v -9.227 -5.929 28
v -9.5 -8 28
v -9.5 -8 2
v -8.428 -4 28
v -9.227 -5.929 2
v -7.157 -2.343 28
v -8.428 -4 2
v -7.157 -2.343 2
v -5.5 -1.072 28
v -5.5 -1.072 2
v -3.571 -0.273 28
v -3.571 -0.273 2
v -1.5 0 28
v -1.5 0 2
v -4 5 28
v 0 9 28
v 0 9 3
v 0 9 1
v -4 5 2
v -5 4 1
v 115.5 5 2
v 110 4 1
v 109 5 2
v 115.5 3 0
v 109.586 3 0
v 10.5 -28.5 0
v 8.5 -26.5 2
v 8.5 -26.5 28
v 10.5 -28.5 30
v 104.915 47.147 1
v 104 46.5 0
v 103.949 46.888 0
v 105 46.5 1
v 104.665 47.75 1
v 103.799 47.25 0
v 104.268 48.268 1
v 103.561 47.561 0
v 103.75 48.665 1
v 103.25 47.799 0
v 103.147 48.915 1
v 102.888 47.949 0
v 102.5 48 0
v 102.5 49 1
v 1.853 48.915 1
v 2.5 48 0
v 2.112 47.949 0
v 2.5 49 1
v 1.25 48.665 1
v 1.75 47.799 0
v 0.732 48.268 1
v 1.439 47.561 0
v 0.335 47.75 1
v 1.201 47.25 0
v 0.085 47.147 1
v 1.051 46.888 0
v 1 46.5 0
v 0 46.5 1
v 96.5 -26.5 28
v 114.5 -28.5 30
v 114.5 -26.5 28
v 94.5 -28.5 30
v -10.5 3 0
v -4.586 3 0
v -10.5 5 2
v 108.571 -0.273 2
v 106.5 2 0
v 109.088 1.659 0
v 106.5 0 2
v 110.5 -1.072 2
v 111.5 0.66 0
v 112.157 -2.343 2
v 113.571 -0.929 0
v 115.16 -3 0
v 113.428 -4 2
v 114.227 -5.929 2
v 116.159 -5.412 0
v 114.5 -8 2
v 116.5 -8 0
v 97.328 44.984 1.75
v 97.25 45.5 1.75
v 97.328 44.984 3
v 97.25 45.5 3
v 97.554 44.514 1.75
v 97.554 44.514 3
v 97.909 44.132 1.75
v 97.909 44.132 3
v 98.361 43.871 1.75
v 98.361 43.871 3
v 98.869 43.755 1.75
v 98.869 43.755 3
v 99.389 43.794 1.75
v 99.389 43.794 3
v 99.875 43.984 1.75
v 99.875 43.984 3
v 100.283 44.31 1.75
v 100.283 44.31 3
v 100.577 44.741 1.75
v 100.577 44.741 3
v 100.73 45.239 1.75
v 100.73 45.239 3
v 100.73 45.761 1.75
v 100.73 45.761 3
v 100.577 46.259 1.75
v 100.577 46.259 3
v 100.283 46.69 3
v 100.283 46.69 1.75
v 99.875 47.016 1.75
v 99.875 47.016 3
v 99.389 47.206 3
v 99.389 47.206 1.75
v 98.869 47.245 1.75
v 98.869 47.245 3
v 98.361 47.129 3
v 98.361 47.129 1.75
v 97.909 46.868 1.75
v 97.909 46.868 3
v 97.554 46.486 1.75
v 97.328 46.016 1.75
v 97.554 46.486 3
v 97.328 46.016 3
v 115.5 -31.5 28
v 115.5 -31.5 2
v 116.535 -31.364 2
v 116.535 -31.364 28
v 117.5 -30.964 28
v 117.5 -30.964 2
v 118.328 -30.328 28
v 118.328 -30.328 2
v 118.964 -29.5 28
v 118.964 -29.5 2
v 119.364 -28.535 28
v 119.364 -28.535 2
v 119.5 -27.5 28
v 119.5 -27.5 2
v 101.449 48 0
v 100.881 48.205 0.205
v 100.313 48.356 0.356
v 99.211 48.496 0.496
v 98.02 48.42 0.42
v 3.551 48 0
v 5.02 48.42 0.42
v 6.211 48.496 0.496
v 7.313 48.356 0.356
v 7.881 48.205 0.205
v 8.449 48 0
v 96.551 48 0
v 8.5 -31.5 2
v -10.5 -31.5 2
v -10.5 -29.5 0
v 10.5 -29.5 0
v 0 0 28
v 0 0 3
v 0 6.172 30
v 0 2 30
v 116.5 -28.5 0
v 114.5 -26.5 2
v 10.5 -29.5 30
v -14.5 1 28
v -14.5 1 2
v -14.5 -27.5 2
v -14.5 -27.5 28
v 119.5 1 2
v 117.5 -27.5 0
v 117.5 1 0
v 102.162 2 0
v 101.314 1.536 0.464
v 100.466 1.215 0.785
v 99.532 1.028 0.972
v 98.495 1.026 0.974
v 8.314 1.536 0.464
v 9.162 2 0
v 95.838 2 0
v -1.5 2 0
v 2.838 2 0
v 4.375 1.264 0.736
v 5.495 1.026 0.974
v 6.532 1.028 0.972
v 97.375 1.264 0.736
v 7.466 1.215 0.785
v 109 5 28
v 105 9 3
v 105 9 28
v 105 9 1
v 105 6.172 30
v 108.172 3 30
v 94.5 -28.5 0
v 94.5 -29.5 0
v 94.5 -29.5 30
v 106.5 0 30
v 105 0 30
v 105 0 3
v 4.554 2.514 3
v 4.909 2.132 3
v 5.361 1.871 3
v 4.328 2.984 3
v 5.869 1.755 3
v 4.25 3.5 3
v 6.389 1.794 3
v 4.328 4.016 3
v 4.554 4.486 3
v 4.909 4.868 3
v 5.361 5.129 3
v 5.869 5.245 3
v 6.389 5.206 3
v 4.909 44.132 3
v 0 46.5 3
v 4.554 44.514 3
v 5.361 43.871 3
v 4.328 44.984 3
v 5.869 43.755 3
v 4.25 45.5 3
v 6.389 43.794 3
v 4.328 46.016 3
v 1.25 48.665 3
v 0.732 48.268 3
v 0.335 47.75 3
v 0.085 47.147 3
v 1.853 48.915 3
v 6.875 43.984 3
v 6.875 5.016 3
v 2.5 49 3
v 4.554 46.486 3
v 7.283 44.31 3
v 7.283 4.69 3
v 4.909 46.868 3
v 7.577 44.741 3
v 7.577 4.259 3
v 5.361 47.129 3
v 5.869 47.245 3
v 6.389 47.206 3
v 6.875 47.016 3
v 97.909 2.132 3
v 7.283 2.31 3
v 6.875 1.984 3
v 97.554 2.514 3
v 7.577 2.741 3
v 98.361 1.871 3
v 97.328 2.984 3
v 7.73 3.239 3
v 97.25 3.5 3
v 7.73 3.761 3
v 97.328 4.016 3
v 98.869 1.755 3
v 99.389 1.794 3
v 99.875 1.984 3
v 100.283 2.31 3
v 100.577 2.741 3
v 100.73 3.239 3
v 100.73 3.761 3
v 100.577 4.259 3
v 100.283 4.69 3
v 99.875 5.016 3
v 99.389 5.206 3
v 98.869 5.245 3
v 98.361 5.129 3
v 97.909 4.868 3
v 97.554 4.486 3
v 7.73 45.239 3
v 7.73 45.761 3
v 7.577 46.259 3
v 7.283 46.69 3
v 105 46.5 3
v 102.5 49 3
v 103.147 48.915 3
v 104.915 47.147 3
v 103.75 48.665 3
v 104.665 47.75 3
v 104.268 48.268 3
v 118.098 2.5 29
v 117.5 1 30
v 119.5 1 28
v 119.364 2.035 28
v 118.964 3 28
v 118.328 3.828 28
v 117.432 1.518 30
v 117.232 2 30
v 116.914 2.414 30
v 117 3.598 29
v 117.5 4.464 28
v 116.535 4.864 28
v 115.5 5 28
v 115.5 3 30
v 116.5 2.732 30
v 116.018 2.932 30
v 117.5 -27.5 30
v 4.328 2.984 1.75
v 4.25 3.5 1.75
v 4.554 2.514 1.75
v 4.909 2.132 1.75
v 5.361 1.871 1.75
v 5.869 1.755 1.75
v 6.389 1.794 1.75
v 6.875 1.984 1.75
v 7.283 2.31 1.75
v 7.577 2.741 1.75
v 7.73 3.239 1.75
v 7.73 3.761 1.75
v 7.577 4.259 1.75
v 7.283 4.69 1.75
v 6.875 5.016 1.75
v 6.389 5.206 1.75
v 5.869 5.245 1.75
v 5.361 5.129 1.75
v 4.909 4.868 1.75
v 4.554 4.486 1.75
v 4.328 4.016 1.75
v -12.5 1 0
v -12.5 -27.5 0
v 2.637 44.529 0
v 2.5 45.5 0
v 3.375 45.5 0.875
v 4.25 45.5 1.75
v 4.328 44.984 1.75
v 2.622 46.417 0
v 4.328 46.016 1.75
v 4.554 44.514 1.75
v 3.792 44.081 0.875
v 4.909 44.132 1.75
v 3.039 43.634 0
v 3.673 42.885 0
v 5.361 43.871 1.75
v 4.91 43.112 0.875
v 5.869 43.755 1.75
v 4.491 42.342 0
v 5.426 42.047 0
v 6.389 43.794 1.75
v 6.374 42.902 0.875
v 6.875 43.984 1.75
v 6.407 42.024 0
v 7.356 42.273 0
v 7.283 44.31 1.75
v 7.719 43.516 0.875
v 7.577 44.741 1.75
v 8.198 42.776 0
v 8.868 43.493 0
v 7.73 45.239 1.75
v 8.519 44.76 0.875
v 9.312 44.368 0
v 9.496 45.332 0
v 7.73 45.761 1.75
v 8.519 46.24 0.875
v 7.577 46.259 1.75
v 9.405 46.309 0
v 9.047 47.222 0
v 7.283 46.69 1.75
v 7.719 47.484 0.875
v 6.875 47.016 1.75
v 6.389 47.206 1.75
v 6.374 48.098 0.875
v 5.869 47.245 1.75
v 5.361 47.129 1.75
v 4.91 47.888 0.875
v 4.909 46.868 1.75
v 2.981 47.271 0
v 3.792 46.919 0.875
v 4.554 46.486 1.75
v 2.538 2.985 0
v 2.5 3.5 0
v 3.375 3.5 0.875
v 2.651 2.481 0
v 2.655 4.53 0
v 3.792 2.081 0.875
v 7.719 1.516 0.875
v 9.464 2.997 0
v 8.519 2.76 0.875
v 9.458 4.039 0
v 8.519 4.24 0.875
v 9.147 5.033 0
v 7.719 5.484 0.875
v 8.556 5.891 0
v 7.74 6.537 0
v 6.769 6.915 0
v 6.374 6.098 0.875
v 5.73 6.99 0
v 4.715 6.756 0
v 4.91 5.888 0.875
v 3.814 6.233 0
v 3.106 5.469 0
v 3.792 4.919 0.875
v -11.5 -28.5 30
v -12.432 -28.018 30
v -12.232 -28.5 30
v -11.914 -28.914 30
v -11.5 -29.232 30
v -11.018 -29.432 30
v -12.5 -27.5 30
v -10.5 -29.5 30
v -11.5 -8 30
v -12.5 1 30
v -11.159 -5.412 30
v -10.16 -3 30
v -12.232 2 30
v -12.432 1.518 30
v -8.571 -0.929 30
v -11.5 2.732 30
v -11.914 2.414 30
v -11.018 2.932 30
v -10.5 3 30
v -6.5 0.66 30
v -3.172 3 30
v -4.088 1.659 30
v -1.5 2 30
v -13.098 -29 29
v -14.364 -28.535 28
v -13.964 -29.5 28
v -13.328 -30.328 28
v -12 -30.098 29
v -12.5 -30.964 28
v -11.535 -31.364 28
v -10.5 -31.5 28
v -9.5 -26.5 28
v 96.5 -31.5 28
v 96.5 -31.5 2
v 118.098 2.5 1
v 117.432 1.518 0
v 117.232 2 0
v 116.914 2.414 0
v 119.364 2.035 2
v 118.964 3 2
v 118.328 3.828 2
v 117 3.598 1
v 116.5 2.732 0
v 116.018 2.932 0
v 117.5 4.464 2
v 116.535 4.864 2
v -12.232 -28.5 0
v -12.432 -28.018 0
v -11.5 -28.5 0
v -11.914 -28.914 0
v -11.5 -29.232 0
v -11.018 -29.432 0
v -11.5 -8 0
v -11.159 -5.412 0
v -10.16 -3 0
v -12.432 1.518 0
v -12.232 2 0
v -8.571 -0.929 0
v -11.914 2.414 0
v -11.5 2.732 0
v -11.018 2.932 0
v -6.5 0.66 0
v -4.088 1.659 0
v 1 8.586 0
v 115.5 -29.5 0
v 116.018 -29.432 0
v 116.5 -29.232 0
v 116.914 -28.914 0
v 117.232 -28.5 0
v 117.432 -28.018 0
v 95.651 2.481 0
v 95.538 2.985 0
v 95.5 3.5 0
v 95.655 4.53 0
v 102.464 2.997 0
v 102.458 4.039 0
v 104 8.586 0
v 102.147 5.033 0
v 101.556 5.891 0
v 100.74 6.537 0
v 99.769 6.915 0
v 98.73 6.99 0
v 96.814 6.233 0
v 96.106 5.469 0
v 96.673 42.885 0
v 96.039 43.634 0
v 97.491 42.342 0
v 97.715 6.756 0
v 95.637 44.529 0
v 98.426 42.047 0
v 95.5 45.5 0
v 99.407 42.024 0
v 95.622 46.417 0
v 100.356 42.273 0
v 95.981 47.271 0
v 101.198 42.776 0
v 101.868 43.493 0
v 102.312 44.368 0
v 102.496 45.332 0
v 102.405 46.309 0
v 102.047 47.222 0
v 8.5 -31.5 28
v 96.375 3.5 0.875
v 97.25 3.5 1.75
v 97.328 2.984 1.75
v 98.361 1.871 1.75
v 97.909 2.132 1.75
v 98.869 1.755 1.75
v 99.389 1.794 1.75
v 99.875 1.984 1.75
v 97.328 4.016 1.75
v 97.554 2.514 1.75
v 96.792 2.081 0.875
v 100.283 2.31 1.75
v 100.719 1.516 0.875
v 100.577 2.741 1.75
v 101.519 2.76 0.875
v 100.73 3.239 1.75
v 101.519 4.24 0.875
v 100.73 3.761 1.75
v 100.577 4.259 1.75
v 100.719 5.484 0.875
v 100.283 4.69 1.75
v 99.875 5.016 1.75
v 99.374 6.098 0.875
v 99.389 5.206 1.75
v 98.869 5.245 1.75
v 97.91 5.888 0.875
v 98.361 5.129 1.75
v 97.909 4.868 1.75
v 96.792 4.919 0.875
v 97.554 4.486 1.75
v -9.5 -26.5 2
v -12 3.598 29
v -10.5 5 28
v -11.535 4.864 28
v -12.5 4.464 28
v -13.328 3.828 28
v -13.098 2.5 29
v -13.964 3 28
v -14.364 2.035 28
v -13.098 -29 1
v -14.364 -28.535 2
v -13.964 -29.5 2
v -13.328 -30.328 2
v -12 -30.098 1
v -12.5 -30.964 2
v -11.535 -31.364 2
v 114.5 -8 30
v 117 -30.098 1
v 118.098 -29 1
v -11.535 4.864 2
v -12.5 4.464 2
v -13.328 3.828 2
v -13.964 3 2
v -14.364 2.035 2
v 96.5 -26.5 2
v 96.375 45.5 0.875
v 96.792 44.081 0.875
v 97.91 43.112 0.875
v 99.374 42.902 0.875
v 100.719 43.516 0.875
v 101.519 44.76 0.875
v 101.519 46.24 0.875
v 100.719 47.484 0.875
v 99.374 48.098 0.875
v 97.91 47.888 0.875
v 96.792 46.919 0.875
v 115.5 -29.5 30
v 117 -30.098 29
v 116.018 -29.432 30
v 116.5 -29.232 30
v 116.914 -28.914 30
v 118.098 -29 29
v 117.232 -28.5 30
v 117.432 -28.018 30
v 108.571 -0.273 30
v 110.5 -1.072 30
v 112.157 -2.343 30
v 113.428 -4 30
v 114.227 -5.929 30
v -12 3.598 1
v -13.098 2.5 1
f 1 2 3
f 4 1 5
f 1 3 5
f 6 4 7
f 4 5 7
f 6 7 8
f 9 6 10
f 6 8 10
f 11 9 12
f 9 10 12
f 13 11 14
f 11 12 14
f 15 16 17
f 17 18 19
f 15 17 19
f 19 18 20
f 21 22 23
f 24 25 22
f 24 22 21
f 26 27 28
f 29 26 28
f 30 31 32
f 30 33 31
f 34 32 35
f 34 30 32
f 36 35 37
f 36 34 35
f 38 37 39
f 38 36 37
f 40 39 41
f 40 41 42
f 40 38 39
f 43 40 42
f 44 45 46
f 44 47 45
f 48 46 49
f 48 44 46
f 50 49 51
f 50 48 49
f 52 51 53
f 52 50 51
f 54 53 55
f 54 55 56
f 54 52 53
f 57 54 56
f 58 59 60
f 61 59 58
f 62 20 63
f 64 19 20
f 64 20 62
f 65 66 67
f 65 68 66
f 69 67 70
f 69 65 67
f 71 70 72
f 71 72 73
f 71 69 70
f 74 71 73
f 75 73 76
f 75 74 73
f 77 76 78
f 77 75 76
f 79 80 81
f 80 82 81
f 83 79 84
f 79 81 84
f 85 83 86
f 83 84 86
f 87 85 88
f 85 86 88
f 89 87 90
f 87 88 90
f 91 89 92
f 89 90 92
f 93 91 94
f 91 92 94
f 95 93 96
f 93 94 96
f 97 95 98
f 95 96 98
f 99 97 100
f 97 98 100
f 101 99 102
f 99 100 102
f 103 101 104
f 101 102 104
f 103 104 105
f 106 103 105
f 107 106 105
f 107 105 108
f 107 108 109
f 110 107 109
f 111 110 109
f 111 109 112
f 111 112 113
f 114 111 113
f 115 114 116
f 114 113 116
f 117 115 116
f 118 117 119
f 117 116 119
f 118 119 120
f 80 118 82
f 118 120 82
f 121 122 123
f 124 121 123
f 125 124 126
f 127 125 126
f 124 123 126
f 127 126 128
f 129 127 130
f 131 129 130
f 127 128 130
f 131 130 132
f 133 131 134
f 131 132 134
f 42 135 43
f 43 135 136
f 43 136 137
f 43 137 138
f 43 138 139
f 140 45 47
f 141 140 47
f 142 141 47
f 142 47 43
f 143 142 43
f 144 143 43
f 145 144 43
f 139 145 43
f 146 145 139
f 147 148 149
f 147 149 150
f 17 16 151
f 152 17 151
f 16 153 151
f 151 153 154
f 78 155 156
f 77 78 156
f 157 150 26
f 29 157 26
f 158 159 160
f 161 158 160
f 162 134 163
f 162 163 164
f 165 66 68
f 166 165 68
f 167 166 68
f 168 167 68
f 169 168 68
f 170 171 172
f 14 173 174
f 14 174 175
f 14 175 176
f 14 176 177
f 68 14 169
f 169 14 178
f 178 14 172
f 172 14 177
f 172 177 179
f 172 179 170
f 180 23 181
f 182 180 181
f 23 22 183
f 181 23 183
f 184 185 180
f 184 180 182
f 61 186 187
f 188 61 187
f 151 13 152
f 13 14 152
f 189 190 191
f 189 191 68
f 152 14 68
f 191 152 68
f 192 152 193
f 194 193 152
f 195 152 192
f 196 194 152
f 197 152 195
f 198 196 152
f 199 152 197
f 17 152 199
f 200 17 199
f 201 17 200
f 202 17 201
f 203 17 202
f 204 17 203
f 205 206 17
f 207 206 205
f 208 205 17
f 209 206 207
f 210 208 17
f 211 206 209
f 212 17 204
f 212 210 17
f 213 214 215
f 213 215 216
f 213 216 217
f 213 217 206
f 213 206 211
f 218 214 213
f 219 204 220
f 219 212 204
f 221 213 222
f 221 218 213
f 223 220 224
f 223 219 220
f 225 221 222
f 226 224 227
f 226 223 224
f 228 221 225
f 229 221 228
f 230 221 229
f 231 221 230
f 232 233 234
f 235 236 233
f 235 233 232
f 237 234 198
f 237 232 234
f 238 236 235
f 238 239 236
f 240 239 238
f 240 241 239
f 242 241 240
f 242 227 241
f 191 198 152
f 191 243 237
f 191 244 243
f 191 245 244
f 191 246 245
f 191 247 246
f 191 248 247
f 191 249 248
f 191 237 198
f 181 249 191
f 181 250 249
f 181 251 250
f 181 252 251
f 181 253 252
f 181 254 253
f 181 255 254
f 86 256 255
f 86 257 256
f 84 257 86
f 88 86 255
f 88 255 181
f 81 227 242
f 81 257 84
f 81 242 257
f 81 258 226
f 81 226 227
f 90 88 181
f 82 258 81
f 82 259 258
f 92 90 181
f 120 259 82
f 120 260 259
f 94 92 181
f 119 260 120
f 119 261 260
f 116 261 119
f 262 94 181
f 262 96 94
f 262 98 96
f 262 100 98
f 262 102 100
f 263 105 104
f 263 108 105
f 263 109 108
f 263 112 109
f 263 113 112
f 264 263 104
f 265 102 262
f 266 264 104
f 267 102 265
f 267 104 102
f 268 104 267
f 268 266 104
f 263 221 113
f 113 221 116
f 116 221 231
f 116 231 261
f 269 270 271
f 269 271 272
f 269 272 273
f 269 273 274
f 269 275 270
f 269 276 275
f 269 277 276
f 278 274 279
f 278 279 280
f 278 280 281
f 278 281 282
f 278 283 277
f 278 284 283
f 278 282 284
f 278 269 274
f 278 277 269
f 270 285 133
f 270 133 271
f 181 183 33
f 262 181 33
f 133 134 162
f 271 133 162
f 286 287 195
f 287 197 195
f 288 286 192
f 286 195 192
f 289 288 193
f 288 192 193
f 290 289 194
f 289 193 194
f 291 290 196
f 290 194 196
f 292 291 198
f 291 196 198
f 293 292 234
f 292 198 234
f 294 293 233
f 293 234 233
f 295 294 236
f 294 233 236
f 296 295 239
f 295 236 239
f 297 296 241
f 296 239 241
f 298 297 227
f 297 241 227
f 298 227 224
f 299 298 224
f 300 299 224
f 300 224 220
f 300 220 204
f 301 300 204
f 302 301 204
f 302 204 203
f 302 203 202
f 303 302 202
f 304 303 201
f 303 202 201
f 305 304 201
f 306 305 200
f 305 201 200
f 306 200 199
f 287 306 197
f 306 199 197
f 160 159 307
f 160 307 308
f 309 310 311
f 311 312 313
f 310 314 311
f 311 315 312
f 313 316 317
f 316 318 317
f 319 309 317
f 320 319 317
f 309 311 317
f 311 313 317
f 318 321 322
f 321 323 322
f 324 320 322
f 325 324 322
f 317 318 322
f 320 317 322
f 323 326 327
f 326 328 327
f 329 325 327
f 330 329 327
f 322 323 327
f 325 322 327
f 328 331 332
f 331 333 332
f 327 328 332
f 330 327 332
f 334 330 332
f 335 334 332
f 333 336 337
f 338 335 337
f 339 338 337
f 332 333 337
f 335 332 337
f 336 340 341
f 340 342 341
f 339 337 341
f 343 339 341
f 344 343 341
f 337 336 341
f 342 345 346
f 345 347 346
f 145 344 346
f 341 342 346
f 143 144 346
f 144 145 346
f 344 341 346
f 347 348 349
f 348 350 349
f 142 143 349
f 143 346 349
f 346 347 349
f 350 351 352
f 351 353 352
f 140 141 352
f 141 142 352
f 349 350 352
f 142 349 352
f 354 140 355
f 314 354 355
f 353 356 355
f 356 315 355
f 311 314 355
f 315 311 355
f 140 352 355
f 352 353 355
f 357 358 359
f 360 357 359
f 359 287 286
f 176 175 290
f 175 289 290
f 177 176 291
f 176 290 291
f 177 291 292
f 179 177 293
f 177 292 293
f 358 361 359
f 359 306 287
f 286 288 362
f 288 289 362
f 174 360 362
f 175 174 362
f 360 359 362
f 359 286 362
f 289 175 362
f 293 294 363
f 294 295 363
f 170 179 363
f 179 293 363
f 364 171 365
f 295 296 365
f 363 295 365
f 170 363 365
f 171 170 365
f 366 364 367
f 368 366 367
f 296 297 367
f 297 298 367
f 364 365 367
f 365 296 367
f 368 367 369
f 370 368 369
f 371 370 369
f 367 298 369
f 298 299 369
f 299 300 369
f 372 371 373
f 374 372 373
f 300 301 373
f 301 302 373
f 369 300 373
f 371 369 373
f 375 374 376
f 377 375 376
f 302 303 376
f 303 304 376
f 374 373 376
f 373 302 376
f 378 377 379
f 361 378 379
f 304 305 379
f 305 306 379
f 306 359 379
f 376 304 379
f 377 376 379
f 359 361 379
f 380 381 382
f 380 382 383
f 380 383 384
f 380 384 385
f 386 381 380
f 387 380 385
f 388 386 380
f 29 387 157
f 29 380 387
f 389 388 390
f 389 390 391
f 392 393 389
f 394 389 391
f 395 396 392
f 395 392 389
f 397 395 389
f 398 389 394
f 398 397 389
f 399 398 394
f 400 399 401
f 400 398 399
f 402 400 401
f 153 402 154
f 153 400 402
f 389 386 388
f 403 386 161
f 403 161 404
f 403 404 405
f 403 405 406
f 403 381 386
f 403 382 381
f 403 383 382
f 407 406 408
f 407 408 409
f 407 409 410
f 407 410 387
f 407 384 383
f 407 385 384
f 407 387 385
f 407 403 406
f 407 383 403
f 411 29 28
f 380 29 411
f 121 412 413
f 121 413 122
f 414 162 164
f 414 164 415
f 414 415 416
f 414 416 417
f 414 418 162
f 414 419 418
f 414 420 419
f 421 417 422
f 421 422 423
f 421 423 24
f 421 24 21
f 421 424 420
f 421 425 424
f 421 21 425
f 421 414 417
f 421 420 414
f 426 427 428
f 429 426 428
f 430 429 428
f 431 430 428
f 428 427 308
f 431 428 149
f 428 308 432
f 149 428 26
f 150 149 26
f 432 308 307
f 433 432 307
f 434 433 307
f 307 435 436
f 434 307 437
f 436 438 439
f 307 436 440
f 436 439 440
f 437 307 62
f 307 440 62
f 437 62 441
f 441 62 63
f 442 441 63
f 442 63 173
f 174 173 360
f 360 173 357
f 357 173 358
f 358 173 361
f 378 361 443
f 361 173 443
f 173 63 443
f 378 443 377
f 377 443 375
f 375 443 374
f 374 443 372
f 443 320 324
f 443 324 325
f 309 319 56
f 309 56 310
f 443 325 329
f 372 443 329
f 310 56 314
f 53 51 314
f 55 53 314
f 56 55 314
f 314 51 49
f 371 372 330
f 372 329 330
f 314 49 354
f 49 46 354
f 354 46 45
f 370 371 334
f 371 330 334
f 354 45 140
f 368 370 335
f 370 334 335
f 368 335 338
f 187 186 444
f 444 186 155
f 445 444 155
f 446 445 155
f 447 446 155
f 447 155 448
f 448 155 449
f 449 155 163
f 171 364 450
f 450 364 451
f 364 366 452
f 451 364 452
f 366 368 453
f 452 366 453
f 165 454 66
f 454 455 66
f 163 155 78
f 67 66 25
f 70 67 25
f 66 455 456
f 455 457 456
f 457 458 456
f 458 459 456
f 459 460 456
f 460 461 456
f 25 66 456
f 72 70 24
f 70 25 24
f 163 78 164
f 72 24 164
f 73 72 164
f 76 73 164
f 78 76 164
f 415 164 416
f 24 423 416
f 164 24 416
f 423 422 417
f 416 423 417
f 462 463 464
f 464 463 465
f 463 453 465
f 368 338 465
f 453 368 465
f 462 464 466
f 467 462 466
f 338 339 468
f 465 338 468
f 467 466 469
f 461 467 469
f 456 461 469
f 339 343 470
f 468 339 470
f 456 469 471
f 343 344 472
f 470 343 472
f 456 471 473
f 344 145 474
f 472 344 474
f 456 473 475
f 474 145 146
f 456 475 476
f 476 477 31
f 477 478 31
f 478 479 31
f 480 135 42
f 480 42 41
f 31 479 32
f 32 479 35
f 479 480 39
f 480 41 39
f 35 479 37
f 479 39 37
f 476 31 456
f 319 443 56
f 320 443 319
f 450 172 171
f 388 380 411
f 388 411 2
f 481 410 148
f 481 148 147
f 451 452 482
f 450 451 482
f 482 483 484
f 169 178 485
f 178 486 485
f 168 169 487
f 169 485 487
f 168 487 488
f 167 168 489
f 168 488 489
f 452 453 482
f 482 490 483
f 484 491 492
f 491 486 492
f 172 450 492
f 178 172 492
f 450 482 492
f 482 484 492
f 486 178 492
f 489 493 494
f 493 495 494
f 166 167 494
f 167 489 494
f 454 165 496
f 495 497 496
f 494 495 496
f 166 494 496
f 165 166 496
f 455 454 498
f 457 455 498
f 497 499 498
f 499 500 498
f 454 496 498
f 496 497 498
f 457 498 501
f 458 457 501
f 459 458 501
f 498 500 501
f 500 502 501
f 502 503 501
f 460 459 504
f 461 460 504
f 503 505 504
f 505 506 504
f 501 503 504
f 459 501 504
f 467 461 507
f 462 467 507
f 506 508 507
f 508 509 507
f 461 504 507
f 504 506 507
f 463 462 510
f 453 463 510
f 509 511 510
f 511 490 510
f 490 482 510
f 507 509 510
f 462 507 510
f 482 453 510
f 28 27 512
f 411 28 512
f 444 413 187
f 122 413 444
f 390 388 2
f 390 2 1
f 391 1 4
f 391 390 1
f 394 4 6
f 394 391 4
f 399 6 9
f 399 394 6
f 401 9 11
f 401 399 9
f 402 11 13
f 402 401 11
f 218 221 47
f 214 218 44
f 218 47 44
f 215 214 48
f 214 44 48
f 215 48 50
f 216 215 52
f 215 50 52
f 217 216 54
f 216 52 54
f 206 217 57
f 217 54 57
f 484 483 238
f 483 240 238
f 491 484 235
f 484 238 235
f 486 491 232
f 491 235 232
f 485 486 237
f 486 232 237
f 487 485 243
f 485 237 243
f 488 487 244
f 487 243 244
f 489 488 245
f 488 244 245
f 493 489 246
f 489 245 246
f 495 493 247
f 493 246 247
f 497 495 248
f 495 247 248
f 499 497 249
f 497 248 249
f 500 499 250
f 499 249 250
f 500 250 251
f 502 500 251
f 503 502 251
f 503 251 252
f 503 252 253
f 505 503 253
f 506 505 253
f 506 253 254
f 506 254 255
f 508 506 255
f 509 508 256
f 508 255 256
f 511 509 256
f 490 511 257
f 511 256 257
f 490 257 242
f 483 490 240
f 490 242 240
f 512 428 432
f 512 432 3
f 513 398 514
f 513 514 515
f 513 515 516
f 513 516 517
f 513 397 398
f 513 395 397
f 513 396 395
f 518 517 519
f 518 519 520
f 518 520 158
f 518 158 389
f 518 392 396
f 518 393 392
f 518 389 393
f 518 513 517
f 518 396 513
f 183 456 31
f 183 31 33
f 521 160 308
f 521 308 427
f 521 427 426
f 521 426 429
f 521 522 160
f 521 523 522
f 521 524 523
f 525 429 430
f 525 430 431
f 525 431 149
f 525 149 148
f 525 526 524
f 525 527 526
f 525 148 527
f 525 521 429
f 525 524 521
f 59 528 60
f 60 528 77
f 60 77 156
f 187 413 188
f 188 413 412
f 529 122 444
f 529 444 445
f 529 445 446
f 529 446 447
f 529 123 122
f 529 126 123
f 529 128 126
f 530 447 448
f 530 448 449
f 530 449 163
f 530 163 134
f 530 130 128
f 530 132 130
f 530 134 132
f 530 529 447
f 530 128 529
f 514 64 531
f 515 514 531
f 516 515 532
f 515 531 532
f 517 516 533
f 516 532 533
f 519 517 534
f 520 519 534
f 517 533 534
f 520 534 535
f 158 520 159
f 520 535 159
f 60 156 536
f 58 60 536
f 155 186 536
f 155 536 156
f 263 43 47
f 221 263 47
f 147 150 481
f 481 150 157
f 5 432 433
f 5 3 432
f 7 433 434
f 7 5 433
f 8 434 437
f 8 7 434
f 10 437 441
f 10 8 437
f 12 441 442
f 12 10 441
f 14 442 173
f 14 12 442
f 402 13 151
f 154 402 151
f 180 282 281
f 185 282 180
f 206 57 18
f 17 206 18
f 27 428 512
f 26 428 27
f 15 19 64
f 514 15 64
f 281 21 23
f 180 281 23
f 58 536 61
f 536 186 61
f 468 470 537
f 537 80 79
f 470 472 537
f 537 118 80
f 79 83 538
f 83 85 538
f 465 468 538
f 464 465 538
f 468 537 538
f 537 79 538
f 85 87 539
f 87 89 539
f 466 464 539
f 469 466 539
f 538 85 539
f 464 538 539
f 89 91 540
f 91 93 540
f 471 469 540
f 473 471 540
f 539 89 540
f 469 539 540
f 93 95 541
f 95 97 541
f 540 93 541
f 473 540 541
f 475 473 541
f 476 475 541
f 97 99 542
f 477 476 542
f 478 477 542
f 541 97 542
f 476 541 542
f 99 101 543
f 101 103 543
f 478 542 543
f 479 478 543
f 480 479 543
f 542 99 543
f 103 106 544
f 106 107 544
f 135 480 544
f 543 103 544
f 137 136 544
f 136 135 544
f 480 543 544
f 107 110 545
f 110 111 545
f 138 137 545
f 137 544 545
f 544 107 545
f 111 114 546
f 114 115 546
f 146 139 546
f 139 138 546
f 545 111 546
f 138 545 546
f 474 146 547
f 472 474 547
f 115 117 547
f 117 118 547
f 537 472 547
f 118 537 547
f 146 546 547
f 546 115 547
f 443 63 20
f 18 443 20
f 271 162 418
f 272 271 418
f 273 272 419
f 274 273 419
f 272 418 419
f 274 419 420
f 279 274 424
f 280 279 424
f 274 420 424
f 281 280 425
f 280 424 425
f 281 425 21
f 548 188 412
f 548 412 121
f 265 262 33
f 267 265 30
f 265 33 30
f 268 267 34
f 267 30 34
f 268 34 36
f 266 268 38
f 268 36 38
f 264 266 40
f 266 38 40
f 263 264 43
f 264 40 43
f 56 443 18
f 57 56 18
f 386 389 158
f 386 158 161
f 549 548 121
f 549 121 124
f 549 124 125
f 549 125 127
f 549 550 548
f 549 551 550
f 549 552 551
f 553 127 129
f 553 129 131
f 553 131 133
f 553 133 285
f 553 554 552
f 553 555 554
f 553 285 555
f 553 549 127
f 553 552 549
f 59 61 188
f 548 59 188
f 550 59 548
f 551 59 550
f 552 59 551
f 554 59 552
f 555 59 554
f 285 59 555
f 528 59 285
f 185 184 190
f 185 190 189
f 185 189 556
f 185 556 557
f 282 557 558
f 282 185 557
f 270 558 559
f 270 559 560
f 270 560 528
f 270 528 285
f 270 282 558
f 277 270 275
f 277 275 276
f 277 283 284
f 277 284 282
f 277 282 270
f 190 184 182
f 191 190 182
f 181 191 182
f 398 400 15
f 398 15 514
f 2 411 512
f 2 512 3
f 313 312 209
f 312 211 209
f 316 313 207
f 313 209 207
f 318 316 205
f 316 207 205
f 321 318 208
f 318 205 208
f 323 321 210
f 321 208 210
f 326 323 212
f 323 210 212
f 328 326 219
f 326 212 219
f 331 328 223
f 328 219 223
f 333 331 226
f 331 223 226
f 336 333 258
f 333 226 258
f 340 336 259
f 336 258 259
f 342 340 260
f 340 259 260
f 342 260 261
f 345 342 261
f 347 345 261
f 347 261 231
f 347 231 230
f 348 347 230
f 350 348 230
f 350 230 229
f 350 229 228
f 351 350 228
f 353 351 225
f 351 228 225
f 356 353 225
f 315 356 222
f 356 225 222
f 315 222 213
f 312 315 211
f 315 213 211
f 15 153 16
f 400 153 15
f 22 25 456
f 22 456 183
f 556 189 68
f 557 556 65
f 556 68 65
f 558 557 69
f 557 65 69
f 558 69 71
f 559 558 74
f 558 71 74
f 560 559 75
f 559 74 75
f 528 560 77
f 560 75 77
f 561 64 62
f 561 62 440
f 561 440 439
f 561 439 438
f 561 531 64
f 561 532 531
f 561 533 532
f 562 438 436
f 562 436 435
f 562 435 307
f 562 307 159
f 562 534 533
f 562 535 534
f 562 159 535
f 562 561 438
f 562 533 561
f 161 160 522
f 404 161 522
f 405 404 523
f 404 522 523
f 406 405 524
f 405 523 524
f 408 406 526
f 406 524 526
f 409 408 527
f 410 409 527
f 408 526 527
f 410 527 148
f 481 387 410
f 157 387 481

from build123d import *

# Parameters (mm, degrees)
F1_DEPTH       = 30
F3_DEPTH       = 27
F4_SIZE        = 2
F5_SIZE        = 2
F7_D           = 3.5
F7_CSINK_D     = 7
F7_CSINK_ANGLE = 90
F8_T1_DEPTH    = 108
F8_T6_DEPTH    = 25.6433659759
F8_T12_DEPTH   = 25.6433659759
F8_T17_DEPTH   = 25.6433659759
F8_T22_DEPTH   = 25.6433659759
F8_T26_ANGLE   = 90
F8_T28_ANGLE   = 90
F9_T1_DEPTH    = 100
F9_T6_DEPTH    = 40.0716830997
F9_T11_DEPTH   = 13.6286473502
F9_T17_DEPTH   = 13.6286473502
F9_T21_ANGLE   = 90
F9_T23_ANGLE   = 90
F9_T27_DEPTH   = 40.0716830997
F9_T33_DEPTH   = 13.6286473502
F9_T37_DEPTH   = 40.0716830997
F9_T44_DEPTH   = 40.0716830997
F9_T48_DEPTH   = 13.6286473502


# Not quite as in the source:
# - a fillet or chamfer that OpenCascade refuses, or shapes differently, is made with other operations: its cross-section is extruded or revolved along the edge and cut away or added


with BuildPart() as f1:
    # F0 (on Top) → F1 (new body)
    with BuildSketch(Plane.XY):
        with BuildLine():
            Line((-1.5, 0), (0, 0))
            Line((0, 0), (105, 0))
            Line((105, 0), (106.5, 0))
            ThreePointArc((106.5, 0), (112.1568542495, -2.3431457505), (114.5, -8))
            Line((114.5, -8), (114.5, -26.5))
            Line((114.5, -26.5), (94.5, -26.5))
            Line((94.5, -26.5), (94.5, -31.4999998882))
            Line((94.5, -31.4999998882), (115.4999998882, -31.4999998882))
            ThreePointArc((115.4999998882, -31.4999998882), (118.328427013, -30.328427013), (119.4999998882, -27.4999998882))
            Line((119.4999998882, -27.4999998882), (119.4999998882, 0.9999998882))
            ThreePointArc((119.4999998882, 0.9999998882), (118.328427013, 3.828427013), (115.4999998882, 4.9999998882))
            Line((115.4999998882, 4.9999998882), (109, 4.9999998882))
            Line((109, 4.9999998882), (105, 8.9999998882))
            Line((105, 8.9999998882), (105, 46.5))
            ThreePointArc((105, 46.5), (104.267766953, 48.267766953), (102.5, 49))
            Line((102.5, 49), (2.5, 49))
            ThreePointArc((2.5, 49), (0.732233047, 48.267766953), (0, 46.5))
            Line((0, 46.5), (0, 8.9999998882))
            Line((0, 8.9999998882), (-4, 4.9999998882))
            Line((-4, 4.9999998882), (-10.4999998882, 4.9999998882))
            ThreePointArc((-10.4999998882, 4.9999998882), (-13.328427013, 3.828427013), (-14.4999998882, 0.9999998882))
            Line((-14.4999998882, 0.9999998882), (-14.4999998882, -27.4999998882))
            ThreePointArc((-14.4999998882, -27.4999998882), (-13.328427013, -30.328427013), (-10.4999998882, -31.4999998882))
            Line((-10.4999998882, -31.4999998882), (10.5, -31.4999998882))
            Line((10.5, -31.4999998882), (10.5, -26.5))
            Line((10.5, -26.5), (-9.5, -26.5))
            Line((-9.5, -26.5), (-9.5, -8))
            ThreePointArc((-9.5, -8), (-7.1568542495, -2.3431457505), (-1.5, 0))
        make_face()
    extrude(amount=F1_DEPTH)

    # F2 (on face) → F3 (cut)
    with BuildSketch(Plane.XY.offset(30)):
        with BuildLine():
            Line((0, 0), (105, 0))
            Line((105, 0), (105, 4.9999998882))
            Line((105, 4.9999998882), (105, 8.9999998882))
            Line((105, 8.9999998882), (105, 46.5))
            ThreePointArc((105, 46.5), (104.267766953, 48.267766953), (102.5, 49))
            Line((102.5, 49), (2.5, 49))
            ThreePointArc((2.5, 49), (0.732233047, 48.267766953), (0, 46.5))
            Line((0, 46.5), (0, 8.9999998882))
            Line((0, 8.9999998882), (0, 4.9999998882))
            Line((0, 4.9999998882), (0, 0))
        make_face()
    extrude(amount=-F3_DEPTH, mode=Mode.SUBTRACT)

    # F4
    f4_edges = [f1.edges().sort_by_distance(p)[0] for p in [
        (94.5, -26.5, 15),
        (94.5, -31.5, 15),
        (10.5, -31.5, 15),
        (10.5, -26.5, 15),
    ]]
    chamfer(f4_edges, length=F4_SIZE)

    # F5
    f5_edges = [f1.edges().sort_by_distance(p)[0] for p in [
        (105.5, -26.5, 0),
        (-0.5, -26.5, 0),
        (-1, -31.5, 0),
        (106, -31.5, 0),
        (-7.25, 5, 30),
        (-9.5, -17.25, 30),
        (-0.5, -26.5, 30),
        (105.5, -26.5, 30),
        (106, -31.5, 30),
        (107, 7, 30),
        (-2, 7, 30),
    ]]
    chamfer(f5_edges, length=F5_SIZE)

    # F7 (through all)
    with Locations(Plane(origin=(0, 0, 0), x_dir=(1, 0, 0), z_dir=(0, 0, -1))):
        with Locations((6, -3.5), (6, -45.5), (99, -3.5), (99, -45.5)):
            CounterSinkHole(F7_D / 2, F7_CSINK_D / 2, counter_sink_angle=F7_CSINK_ANGLE)

    # F8: chamfer of 2 on 5 edges, made by hand

    # F8_s2 → F8_t1 (cut)
    with BuildSketch(Plane.YZ.offset(-1.5)):
        Polygon((2, 0), (0, 2), (0, 0), align=None)
    extrude(amount=F8_T1_DEPTH, mode=Mode.SUBTRACT)


with BuildPart() as f8_tool4:
    # F8_s5 → F8_t6 (new body)
    with BuildSketch(Plane.XZ.offset(33.6433659759)):
        Polygon((116.5, 0), (114.5, 2), (114.5, 0), align=None)
    extrude(amount=-F8_T6_DEPTH)

    split(bisect_by=Plane.XZ.offset(26.5), keep=Keep.TOP)

    split(bisect_by=Plane(origin=(0, -14.25, 14.25), x_dir=(1, 0, 0), z_dir=(0, 0.7071067812, -0.7071067812)), keep=Keep.TOP)


with BuildPart() as f1_1:
    add(f1.part)

    # F8_t3: cut F8_tool4
    add(f8_tool4.part, mode=Mode.SUBTRACT)


with BuildPart() as f8_tool10:
    # F8_s11 → F8_t12 (new body)
    with BuildSketch(Plane.XZ.offset(33.6433659759)):
        Polygon((116.5, 0), (114.5, 2), (114.5, 0), align=None)
    extrude(amount=-F8_T12_DEPTH)

    split(bisect_by=Plane.XZ.offset(26.5), keep=Keep.BOTTOM)


with BuildPart() as f1_2:
    add(f1_1.part)

    # F8_t9: cut F8_tool10
    add(f8_tool10.part, mode=Mode.SUBTRACT)


with BuildPart() as f8_tool15:
    # F8_s16 → F8_t17 (new body)
    with BuildSketch(Plane.XZ.offset(8)):
        Polygon((-11.5, 0), (-9.5, 2), (-9.5, 0), align=None)
    extrude(amount=F8_T17_DEPTH)

    split(bisect_by=Plane.XZ.offset(26.5), keep=Keep.BOTTOM)


with BuildPart() as f1_3:
    add(f1_2.part)

    # F8_t14: cut F8_tool15
    add(f8_tool15.part, mode=Mode.SUBTRACT)


with BuildPart() as f8_tool20:
    # F8_s21 → F8_t22 (new body)
    with BuildSketch(Plane.XZ.offset(8)):
        Polygon((-11.5, 0), (-9.5, 2), (-9.5, 0), align=None)
    extrude(amount=F8_T22_DEPTH)

    split(bisect_by=Plane.XZ.offset(26.5), keep=Keep.TOP)

    split(bisect_by=Plane(origin=(0, -14.25, 14.25), x_dir=(1, 0, 0), z_dir=(0, 0.7071067812, -0.7071067812)), keep=Keep.TOP)


with BuildPart() as f1_4:
    add(f1_3.part)

    # F8_t19: cut F8_tool20
    add(f8_tool20.part, mode=Mode.SUBTRACT)

    # F8_s25 → F8_t26 (revolve, cut)
    with BuildSketch(Plane.XZ.offset(8)):
        Polygon((-11.5, 0), (-9.5, 2), (-9.5, 0), align=None)
    revolve(axis=Axis((-1.5, -8, 0), (0, 0, -1)), revolution_arc=F8_T26_ANGLE, mode=Mode.SUBTRACT)

    # F8_s27 → F8_t28 (revolve, cut)
    with BuildSketch(Plane.YZ.offset(106.5)):
        Polygon((2, 0), (0, 2), (0, 0), align=None)
    revolve(axis=Axis((106.5, -8, 0), (0, 0, -1)), revolution_arc=F8_T28_ANGLE, mode=Mode.SUBTRACT)

    # F9: chamfer of 1 on 7 edges, made by hand

    # F9_s2 → F9_t1 (cut)
    with BuildSketch(Plane.YZ.offset(2.5)):
        Polygon((48, 0), (49, 1), (49, 0), align=None)
    extrude(amount=F9_T1_DEPTH, mode=Mode.SUBTRACT)


with BuildPart() as f9_tool4:
    # F9_s5 → F9_t6 (new body)
    with BuildSketch(Plane.XZ.offset(-46.5)):
        Polygon((1, 0), (0, 1), (0, 0), align=None)
    extrude(amount=F9_T6_DEPTH)

    split(bisect_by=Plane(origin=(-4.4999999441, 4.4999999441, 0), x_dir=(0, 0, 1), z_dir=(-0.7071067812, 0.7071067812, 0)), keep=Keep.TOP)


with BuildPart() as f1_5:
    add(f1_4.part)

    # F9_t3: cut F9_tool4
    add(f9_tool4.part, mode=Mode.SUBTRACT)


with BuildPart() as f9_tool9:
    # F9_s10 → F9_t11 (new body)
    with BuildSketch(Plane(origin=(-3.3184545357, -3.3184545357, 0), x_dir=(0, 0, 1), z_dir=(0.7071067812, 0.7071067812, 0))):
        Polygon((0, -5.3639609517), (1, -6.3639609517), (0, -6.3639609517), align=None)
    extrude(amount=F9_T11_DEPTH)

    split(bisect_by=Plane(origin=(0, 1.4999999441, -1.4999999441), x_dir=(1, 0, 0), z_dir=(0, 0.7071067812, -0.7071067812)), keep=Keep.TOP)

    split(bisect_by=Plane.YZ, keep=Keep.BOTTOM)


with BuildPart() as f1_6:
    add(f1_5.part)

    # F9_t8: cut F9_tool9
    add(f9_tool9.part, mode=Mode.SUBTRACT)


with BuildPart() as f9_tool15:
    # F9_s16 → F9_t17 (new body)
    with BuildSketch(Plane(origin=(46.181545576, -46.181545576, 0), x_dir=(0, 0, 1), z_dir=(0.7071067812, -0.7071067812, 0))):
        Polygon((0, -79.6101729762), (1, -80.6101729762), (0, -80.6101729762), align=None)
    extrude(amount=F9_T17_DEPTH)

    split(bisect_by=Plane.YZ.offset(105), keep=Keep.TOP)

    split(bisect_by=Plane(origin=(0, 1.4999999441, -1.4999999441), x_dir=(1, 0, 0), z_dir=(0, 0.7071067812, -0.7071067812)), keep=Keep.TOP)


with BuildPart() as f1_7:
    add(f1_6.part)

    # F9_t14: cut F9_tool15
    add(f9_tool15.part, mode=Mode.SUBTRACT)

    # F9_s20 → F9_t21 (revolve, cut)
    with BuildSketch(Plane.YZ.offset(2.5)):
        Polygon((48, 0), (49, 1), (49, 0), align=None)
    revolve(axis=Axis((2.5, 46.5, 0), (0, 0, 1)), revolution_arc=F9_T21_ANGLE, mode=Mode.SUBTRACT)

    # F9_s22 → F9_t23 (revolve, cut)
    with BuildSketch(Plane.XZ.offset(-46.5)):
        Polygon((104, 0), (105, 1), (105, 0), align=None)
    revolve(axis=Axis((102.5, 46.5, 0), (0, 0, 1)), revolution_arc=F9_T23_ANGLE, mode=Mode.SUBTRACT)


with BuildPart() as f9_tool25:
    # F9_s26 → F9_t27 (new body)
    with BuildSketch(Plane.XZ.offset(-6.4283169003)):
        Polygon((104, 0), (105, 1), (105, 0), align=None)
    extrude(amount=-F9_T27_DEPTH)

    split(bisect_by=Plane(origin=(56.9999999441, 56.9999999441, 0), x_dir=(0, 0, 1), z_dir=(0.7071067812, 0.7071067812, 0)), keep=Keep.TOP)


with BuildPart() as f1_8:
    add(f1_7.part)

    # F9_t24: cut F9_tool25
    add(f9_tool25.part, mode=Mode.SUBTRACT)


with BuildPart() as f9_tool31:
    # F9_s32 → F9_t33 (new body)
    with BuildSketch(Plane(origin=(-3.3184545357, -3.3184545357, 0), x_dir=(0, 0, 1), z_dir=(0.7071067812, 0.7071067812, 0))):
        Polygon((0, -5.3639609517), (1, -6.3639609517), (0, -6.3639609517), align=None)
    extrude(amount=F9_T33_DEPTH)

    split(bisect_by=Plane.YZ, keep=Keep.TOP)


with BuildPart() as f9_tool35:
    # F9_s36 → F9_t37 (new body)
    with BuildSketch(Plane.XZ.offset(-46.5)):
        Polygon((1, 0), (0, 1), (0, 0), align=None)
    extrude(amount=F9_T37_DEPTH)

    split(bisect_by=Plane(origin=(-4.4999999441, 4.4999999441, 0), x_dir=(0, 0, 1), z_dir=(0.7071067812, -0.7071067812, 0)), keep=Keep.TOP)


with BuildPart() as f9_tool31_1:
    add(f9_tool31.part)

    # F9_t39: intersect F9_tool35
    add(f9_tool35.part, mode=Mode.INTERSECT)


with BuildPart() as f1_9:
    add(f1_8.part)

    # F9_t29: cut F9_tool31
    add(f9_tool31_1.part, mode=Mode.SUBTRACT)


with BuildPart() as f9_tool42:
    # F9_s43 → F9_t44 (new body)
    with BuildSketch(Plane.XZ.offset(-6.4283169003)):
        Polygon((104, 0), (105, 1), (105, 0), align=None)
    extrude(amount=-F9_T44_DEPTH)

    split(bisect_by=Plane(origin=(56.9999999441, 56.9999999441, 0), x_dir=(0, 0, 1), z_dir=(-0.7071067812, -0.7071067812, 0)), keep=Keep.TOP)


with BuildPart() as f9_tool46:
    # F9_s47 → F9_t48 (new body)
    with BuildSketch(Plane(origin=(46.181545576, -46.181545576, 0), x_dir=(0, 0, 1), z_dir=(0.7071067812, -0.7071067812, 0))):
        Polygon((0, -79.6101729762), (1, -80.6101729762), (0, -80.6101729762), align=None)
    extrude(amount=F9_T48_DEPTH)

    split(bisect_by=Plane.YZ.offset(105), keep=Keep.BOTTOM)


with BuildPart() as f9_tool42_1:
    add(f9_tool42.part)

    # F9_t50: intersect F9_tool46
    add(f9_tool46.part, mode=Mode.INTERSECT)


with BuildPart() as f1_10:
    add(f1_9.part)

    # F9_t40: cut F9_tool42
    add(f9_tool42_1.part, mode=Mode.SUBTRACT)


solid = f1_10.part
